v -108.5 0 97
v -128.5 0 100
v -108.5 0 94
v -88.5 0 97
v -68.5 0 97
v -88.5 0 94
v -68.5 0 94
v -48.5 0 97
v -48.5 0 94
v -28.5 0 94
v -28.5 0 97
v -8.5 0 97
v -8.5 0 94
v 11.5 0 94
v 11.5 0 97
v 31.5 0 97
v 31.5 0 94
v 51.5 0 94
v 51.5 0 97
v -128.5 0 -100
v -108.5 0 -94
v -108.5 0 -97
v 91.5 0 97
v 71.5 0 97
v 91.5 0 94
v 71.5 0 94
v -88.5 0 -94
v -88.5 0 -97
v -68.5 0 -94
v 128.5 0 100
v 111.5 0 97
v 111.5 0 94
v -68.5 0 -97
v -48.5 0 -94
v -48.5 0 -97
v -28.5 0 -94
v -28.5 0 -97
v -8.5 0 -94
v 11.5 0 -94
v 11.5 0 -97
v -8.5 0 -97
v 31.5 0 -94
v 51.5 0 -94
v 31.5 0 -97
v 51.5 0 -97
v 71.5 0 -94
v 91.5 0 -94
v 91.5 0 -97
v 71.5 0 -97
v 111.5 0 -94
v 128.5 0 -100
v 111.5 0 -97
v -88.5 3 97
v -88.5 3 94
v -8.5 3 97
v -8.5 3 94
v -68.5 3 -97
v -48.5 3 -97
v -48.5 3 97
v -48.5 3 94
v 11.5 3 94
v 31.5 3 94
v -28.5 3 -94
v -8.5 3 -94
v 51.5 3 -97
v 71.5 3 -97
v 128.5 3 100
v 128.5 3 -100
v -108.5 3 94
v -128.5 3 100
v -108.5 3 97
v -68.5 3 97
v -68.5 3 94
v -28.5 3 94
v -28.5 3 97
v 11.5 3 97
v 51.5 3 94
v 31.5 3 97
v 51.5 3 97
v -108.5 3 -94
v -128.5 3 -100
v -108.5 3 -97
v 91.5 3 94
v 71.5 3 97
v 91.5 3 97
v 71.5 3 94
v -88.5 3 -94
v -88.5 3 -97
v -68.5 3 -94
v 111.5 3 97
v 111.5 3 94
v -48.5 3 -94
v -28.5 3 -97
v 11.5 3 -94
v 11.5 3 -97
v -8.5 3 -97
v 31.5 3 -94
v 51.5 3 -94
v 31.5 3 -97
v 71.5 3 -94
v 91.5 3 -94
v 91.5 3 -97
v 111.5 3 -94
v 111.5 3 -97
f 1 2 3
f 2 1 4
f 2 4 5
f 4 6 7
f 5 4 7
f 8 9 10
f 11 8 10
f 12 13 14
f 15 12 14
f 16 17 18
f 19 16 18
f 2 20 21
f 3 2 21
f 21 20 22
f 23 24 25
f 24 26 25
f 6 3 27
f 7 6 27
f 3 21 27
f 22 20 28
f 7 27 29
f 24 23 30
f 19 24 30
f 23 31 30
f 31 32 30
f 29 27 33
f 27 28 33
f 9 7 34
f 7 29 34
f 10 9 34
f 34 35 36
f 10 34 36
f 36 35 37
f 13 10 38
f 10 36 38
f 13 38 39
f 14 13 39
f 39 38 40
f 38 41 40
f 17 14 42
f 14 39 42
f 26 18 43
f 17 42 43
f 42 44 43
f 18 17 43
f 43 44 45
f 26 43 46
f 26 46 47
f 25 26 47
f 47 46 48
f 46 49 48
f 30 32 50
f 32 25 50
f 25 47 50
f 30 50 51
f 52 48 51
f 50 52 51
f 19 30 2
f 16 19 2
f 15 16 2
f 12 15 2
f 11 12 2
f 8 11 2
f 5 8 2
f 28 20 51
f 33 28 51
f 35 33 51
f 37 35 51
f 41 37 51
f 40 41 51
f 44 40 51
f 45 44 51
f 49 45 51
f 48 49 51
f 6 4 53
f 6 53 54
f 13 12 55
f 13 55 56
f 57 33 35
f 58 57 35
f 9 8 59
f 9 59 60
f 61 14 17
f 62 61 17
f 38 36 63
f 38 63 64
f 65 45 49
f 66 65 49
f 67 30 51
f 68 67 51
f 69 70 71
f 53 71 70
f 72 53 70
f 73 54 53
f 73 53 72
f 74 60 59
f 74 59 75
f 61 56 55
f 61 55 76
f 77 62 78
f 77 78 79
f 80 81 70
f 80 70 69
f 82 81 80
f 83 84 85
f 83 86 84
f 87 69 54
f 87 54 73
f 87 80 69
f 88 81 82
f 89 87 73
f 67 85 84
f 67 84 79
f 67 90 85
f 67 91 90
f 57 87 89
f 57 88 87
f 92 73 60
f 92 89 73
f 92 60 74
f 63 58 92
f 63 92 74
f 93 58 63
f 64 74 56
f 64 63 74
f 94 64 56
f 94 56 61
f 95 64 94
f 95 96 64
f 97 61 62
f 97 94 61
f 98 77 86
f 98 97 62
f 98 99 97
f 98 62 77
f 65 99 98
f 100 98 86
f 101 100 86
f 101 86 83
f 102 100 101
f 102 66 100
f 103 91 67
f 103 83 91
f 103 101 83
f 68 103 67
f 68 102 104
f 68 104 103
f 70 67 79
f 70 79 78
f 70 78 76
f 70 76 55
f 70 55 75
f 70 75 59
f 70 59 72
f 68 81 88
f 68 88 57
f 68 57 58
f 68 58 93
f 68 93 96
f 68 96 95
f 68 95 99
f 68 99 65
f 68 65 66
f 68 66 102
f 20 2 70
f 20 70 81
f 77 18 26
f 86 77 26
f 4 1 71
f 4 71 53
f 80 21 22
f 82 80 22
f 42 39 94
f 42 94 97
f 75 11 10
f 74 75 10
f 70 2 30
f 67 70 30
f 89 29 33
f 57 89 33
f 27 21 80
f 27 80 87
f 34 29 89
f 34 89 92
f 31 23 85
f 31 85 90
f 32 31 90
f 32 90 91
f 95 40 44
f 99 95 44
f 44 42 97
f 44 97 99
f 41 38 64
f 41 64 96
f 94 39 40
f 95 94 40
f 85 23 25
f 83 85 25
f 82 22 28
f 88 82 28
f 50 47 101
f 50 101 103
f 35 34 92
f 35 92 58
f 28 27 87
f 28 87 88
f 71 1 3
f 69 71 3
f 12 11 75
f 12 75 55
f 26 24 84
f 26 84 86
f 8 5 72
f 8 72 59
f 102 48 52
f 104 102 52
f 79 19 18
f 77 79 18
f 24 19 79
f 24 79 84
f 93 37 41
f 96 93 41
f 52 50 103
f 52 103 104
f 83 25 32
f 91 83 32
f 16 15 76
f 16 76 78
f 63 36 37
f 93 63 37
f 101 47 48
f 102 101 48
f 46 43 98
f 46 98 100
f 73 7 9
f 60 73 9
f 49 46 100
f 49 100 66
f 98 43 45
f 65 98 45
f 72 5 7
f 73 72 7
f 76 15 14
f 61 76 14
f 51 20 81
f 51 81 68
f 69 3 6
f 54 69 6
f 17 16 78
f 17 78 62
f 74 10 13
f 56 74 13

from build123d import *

# Parameters (mm, degrees)
ESQUISSE1_W        = 257
ESQUISSE1_H        = 200
ESQUISSE1_W_2      = 20
ESQUISSE1_H_2      = 3
BOSS_EXTRU_1_DEPTH = 3


with BuildPart() as part:
    # Esquisse1 → Boss.-Extru.1 (new body)
    with BuildSketch(Plane(origin=(0, 0, 0), x_dir=(1, 0, 0), z_dir=(0, 1, 0))):
        Rectangle(ESQUISSE1_W, ESQUISSE1_H)
        with Locations((-58.5, -95.5)):
            Rectangle(ESQUISSE1_W_2, ESQUISSE1_H_2, mode=Mode.SUBTRACT)
        with Locations((-98.5, -95.5)):
            Rectangle(ESQUISSE1_W_2, ESQUISSE1_H_2, mode=Mode.SUBTRACT)
        with Locations((-18.5, -95.5)):
            Rectangle(ESQUISSE1_W_2, ESQUISSE1_H_2, mode=Mode.SUBTRACT)
        with Locations((21.5, -95.5)):
            Rectangle(ESQUISSE1_W_2, ESQUISSE1_H_2, mode=Mode.SUBTRACT)
        with Locations((61.5, -95.5)):
            Rectangle(ESQUISSE1_W_2, ESQUISSE1_H_2, mode=Mode.SUBTRACT)
        with Locations((101.5, -95.5)):
            Rectangle(ESQUISSE1_W_2, ESQUISSE1_H_2, mode=Mode.SUBTRACT)
        with Locations((101.5, 95.5)):
            Rectangle(ESQUISSE1_W_2, ESQUISSE1_H_2, mode=Mode.SUBTRACT)
        with Locations((61.5, 95.5)):
            Rectangle(ESQUISSE1_W_2, ESQUISSE1_H_2, mode=Mode.SUBTRACT)
        with Locations((21.5, 95.5)):
            Rectangle(ESQUISSE1_W_2, ESQUISSE1_H_2, mode=Mode.SUBTRACT)
        with Locations((-18.5, 95.5)):
            Rectangle(ESQUISSE1_W_2, ESQUISSE1_H_2, mode=Mode.SUBTRACT)
        with Locations((-58.5, 95.5)):
            Rectangle(ESQUISSE1_W_2, ESQUISSE1_H_2, mode=Mode.SUBTRACT)
        with Locations((-98.5, 95.5)):
            Rectangle(ESQUISSE1_W_2, ESQUISSE1_H_2, mode=Mode.SUBTRACT)
    extrude(amount=BOSS_EXTRU_1_DEPTH)


solid = part.part
